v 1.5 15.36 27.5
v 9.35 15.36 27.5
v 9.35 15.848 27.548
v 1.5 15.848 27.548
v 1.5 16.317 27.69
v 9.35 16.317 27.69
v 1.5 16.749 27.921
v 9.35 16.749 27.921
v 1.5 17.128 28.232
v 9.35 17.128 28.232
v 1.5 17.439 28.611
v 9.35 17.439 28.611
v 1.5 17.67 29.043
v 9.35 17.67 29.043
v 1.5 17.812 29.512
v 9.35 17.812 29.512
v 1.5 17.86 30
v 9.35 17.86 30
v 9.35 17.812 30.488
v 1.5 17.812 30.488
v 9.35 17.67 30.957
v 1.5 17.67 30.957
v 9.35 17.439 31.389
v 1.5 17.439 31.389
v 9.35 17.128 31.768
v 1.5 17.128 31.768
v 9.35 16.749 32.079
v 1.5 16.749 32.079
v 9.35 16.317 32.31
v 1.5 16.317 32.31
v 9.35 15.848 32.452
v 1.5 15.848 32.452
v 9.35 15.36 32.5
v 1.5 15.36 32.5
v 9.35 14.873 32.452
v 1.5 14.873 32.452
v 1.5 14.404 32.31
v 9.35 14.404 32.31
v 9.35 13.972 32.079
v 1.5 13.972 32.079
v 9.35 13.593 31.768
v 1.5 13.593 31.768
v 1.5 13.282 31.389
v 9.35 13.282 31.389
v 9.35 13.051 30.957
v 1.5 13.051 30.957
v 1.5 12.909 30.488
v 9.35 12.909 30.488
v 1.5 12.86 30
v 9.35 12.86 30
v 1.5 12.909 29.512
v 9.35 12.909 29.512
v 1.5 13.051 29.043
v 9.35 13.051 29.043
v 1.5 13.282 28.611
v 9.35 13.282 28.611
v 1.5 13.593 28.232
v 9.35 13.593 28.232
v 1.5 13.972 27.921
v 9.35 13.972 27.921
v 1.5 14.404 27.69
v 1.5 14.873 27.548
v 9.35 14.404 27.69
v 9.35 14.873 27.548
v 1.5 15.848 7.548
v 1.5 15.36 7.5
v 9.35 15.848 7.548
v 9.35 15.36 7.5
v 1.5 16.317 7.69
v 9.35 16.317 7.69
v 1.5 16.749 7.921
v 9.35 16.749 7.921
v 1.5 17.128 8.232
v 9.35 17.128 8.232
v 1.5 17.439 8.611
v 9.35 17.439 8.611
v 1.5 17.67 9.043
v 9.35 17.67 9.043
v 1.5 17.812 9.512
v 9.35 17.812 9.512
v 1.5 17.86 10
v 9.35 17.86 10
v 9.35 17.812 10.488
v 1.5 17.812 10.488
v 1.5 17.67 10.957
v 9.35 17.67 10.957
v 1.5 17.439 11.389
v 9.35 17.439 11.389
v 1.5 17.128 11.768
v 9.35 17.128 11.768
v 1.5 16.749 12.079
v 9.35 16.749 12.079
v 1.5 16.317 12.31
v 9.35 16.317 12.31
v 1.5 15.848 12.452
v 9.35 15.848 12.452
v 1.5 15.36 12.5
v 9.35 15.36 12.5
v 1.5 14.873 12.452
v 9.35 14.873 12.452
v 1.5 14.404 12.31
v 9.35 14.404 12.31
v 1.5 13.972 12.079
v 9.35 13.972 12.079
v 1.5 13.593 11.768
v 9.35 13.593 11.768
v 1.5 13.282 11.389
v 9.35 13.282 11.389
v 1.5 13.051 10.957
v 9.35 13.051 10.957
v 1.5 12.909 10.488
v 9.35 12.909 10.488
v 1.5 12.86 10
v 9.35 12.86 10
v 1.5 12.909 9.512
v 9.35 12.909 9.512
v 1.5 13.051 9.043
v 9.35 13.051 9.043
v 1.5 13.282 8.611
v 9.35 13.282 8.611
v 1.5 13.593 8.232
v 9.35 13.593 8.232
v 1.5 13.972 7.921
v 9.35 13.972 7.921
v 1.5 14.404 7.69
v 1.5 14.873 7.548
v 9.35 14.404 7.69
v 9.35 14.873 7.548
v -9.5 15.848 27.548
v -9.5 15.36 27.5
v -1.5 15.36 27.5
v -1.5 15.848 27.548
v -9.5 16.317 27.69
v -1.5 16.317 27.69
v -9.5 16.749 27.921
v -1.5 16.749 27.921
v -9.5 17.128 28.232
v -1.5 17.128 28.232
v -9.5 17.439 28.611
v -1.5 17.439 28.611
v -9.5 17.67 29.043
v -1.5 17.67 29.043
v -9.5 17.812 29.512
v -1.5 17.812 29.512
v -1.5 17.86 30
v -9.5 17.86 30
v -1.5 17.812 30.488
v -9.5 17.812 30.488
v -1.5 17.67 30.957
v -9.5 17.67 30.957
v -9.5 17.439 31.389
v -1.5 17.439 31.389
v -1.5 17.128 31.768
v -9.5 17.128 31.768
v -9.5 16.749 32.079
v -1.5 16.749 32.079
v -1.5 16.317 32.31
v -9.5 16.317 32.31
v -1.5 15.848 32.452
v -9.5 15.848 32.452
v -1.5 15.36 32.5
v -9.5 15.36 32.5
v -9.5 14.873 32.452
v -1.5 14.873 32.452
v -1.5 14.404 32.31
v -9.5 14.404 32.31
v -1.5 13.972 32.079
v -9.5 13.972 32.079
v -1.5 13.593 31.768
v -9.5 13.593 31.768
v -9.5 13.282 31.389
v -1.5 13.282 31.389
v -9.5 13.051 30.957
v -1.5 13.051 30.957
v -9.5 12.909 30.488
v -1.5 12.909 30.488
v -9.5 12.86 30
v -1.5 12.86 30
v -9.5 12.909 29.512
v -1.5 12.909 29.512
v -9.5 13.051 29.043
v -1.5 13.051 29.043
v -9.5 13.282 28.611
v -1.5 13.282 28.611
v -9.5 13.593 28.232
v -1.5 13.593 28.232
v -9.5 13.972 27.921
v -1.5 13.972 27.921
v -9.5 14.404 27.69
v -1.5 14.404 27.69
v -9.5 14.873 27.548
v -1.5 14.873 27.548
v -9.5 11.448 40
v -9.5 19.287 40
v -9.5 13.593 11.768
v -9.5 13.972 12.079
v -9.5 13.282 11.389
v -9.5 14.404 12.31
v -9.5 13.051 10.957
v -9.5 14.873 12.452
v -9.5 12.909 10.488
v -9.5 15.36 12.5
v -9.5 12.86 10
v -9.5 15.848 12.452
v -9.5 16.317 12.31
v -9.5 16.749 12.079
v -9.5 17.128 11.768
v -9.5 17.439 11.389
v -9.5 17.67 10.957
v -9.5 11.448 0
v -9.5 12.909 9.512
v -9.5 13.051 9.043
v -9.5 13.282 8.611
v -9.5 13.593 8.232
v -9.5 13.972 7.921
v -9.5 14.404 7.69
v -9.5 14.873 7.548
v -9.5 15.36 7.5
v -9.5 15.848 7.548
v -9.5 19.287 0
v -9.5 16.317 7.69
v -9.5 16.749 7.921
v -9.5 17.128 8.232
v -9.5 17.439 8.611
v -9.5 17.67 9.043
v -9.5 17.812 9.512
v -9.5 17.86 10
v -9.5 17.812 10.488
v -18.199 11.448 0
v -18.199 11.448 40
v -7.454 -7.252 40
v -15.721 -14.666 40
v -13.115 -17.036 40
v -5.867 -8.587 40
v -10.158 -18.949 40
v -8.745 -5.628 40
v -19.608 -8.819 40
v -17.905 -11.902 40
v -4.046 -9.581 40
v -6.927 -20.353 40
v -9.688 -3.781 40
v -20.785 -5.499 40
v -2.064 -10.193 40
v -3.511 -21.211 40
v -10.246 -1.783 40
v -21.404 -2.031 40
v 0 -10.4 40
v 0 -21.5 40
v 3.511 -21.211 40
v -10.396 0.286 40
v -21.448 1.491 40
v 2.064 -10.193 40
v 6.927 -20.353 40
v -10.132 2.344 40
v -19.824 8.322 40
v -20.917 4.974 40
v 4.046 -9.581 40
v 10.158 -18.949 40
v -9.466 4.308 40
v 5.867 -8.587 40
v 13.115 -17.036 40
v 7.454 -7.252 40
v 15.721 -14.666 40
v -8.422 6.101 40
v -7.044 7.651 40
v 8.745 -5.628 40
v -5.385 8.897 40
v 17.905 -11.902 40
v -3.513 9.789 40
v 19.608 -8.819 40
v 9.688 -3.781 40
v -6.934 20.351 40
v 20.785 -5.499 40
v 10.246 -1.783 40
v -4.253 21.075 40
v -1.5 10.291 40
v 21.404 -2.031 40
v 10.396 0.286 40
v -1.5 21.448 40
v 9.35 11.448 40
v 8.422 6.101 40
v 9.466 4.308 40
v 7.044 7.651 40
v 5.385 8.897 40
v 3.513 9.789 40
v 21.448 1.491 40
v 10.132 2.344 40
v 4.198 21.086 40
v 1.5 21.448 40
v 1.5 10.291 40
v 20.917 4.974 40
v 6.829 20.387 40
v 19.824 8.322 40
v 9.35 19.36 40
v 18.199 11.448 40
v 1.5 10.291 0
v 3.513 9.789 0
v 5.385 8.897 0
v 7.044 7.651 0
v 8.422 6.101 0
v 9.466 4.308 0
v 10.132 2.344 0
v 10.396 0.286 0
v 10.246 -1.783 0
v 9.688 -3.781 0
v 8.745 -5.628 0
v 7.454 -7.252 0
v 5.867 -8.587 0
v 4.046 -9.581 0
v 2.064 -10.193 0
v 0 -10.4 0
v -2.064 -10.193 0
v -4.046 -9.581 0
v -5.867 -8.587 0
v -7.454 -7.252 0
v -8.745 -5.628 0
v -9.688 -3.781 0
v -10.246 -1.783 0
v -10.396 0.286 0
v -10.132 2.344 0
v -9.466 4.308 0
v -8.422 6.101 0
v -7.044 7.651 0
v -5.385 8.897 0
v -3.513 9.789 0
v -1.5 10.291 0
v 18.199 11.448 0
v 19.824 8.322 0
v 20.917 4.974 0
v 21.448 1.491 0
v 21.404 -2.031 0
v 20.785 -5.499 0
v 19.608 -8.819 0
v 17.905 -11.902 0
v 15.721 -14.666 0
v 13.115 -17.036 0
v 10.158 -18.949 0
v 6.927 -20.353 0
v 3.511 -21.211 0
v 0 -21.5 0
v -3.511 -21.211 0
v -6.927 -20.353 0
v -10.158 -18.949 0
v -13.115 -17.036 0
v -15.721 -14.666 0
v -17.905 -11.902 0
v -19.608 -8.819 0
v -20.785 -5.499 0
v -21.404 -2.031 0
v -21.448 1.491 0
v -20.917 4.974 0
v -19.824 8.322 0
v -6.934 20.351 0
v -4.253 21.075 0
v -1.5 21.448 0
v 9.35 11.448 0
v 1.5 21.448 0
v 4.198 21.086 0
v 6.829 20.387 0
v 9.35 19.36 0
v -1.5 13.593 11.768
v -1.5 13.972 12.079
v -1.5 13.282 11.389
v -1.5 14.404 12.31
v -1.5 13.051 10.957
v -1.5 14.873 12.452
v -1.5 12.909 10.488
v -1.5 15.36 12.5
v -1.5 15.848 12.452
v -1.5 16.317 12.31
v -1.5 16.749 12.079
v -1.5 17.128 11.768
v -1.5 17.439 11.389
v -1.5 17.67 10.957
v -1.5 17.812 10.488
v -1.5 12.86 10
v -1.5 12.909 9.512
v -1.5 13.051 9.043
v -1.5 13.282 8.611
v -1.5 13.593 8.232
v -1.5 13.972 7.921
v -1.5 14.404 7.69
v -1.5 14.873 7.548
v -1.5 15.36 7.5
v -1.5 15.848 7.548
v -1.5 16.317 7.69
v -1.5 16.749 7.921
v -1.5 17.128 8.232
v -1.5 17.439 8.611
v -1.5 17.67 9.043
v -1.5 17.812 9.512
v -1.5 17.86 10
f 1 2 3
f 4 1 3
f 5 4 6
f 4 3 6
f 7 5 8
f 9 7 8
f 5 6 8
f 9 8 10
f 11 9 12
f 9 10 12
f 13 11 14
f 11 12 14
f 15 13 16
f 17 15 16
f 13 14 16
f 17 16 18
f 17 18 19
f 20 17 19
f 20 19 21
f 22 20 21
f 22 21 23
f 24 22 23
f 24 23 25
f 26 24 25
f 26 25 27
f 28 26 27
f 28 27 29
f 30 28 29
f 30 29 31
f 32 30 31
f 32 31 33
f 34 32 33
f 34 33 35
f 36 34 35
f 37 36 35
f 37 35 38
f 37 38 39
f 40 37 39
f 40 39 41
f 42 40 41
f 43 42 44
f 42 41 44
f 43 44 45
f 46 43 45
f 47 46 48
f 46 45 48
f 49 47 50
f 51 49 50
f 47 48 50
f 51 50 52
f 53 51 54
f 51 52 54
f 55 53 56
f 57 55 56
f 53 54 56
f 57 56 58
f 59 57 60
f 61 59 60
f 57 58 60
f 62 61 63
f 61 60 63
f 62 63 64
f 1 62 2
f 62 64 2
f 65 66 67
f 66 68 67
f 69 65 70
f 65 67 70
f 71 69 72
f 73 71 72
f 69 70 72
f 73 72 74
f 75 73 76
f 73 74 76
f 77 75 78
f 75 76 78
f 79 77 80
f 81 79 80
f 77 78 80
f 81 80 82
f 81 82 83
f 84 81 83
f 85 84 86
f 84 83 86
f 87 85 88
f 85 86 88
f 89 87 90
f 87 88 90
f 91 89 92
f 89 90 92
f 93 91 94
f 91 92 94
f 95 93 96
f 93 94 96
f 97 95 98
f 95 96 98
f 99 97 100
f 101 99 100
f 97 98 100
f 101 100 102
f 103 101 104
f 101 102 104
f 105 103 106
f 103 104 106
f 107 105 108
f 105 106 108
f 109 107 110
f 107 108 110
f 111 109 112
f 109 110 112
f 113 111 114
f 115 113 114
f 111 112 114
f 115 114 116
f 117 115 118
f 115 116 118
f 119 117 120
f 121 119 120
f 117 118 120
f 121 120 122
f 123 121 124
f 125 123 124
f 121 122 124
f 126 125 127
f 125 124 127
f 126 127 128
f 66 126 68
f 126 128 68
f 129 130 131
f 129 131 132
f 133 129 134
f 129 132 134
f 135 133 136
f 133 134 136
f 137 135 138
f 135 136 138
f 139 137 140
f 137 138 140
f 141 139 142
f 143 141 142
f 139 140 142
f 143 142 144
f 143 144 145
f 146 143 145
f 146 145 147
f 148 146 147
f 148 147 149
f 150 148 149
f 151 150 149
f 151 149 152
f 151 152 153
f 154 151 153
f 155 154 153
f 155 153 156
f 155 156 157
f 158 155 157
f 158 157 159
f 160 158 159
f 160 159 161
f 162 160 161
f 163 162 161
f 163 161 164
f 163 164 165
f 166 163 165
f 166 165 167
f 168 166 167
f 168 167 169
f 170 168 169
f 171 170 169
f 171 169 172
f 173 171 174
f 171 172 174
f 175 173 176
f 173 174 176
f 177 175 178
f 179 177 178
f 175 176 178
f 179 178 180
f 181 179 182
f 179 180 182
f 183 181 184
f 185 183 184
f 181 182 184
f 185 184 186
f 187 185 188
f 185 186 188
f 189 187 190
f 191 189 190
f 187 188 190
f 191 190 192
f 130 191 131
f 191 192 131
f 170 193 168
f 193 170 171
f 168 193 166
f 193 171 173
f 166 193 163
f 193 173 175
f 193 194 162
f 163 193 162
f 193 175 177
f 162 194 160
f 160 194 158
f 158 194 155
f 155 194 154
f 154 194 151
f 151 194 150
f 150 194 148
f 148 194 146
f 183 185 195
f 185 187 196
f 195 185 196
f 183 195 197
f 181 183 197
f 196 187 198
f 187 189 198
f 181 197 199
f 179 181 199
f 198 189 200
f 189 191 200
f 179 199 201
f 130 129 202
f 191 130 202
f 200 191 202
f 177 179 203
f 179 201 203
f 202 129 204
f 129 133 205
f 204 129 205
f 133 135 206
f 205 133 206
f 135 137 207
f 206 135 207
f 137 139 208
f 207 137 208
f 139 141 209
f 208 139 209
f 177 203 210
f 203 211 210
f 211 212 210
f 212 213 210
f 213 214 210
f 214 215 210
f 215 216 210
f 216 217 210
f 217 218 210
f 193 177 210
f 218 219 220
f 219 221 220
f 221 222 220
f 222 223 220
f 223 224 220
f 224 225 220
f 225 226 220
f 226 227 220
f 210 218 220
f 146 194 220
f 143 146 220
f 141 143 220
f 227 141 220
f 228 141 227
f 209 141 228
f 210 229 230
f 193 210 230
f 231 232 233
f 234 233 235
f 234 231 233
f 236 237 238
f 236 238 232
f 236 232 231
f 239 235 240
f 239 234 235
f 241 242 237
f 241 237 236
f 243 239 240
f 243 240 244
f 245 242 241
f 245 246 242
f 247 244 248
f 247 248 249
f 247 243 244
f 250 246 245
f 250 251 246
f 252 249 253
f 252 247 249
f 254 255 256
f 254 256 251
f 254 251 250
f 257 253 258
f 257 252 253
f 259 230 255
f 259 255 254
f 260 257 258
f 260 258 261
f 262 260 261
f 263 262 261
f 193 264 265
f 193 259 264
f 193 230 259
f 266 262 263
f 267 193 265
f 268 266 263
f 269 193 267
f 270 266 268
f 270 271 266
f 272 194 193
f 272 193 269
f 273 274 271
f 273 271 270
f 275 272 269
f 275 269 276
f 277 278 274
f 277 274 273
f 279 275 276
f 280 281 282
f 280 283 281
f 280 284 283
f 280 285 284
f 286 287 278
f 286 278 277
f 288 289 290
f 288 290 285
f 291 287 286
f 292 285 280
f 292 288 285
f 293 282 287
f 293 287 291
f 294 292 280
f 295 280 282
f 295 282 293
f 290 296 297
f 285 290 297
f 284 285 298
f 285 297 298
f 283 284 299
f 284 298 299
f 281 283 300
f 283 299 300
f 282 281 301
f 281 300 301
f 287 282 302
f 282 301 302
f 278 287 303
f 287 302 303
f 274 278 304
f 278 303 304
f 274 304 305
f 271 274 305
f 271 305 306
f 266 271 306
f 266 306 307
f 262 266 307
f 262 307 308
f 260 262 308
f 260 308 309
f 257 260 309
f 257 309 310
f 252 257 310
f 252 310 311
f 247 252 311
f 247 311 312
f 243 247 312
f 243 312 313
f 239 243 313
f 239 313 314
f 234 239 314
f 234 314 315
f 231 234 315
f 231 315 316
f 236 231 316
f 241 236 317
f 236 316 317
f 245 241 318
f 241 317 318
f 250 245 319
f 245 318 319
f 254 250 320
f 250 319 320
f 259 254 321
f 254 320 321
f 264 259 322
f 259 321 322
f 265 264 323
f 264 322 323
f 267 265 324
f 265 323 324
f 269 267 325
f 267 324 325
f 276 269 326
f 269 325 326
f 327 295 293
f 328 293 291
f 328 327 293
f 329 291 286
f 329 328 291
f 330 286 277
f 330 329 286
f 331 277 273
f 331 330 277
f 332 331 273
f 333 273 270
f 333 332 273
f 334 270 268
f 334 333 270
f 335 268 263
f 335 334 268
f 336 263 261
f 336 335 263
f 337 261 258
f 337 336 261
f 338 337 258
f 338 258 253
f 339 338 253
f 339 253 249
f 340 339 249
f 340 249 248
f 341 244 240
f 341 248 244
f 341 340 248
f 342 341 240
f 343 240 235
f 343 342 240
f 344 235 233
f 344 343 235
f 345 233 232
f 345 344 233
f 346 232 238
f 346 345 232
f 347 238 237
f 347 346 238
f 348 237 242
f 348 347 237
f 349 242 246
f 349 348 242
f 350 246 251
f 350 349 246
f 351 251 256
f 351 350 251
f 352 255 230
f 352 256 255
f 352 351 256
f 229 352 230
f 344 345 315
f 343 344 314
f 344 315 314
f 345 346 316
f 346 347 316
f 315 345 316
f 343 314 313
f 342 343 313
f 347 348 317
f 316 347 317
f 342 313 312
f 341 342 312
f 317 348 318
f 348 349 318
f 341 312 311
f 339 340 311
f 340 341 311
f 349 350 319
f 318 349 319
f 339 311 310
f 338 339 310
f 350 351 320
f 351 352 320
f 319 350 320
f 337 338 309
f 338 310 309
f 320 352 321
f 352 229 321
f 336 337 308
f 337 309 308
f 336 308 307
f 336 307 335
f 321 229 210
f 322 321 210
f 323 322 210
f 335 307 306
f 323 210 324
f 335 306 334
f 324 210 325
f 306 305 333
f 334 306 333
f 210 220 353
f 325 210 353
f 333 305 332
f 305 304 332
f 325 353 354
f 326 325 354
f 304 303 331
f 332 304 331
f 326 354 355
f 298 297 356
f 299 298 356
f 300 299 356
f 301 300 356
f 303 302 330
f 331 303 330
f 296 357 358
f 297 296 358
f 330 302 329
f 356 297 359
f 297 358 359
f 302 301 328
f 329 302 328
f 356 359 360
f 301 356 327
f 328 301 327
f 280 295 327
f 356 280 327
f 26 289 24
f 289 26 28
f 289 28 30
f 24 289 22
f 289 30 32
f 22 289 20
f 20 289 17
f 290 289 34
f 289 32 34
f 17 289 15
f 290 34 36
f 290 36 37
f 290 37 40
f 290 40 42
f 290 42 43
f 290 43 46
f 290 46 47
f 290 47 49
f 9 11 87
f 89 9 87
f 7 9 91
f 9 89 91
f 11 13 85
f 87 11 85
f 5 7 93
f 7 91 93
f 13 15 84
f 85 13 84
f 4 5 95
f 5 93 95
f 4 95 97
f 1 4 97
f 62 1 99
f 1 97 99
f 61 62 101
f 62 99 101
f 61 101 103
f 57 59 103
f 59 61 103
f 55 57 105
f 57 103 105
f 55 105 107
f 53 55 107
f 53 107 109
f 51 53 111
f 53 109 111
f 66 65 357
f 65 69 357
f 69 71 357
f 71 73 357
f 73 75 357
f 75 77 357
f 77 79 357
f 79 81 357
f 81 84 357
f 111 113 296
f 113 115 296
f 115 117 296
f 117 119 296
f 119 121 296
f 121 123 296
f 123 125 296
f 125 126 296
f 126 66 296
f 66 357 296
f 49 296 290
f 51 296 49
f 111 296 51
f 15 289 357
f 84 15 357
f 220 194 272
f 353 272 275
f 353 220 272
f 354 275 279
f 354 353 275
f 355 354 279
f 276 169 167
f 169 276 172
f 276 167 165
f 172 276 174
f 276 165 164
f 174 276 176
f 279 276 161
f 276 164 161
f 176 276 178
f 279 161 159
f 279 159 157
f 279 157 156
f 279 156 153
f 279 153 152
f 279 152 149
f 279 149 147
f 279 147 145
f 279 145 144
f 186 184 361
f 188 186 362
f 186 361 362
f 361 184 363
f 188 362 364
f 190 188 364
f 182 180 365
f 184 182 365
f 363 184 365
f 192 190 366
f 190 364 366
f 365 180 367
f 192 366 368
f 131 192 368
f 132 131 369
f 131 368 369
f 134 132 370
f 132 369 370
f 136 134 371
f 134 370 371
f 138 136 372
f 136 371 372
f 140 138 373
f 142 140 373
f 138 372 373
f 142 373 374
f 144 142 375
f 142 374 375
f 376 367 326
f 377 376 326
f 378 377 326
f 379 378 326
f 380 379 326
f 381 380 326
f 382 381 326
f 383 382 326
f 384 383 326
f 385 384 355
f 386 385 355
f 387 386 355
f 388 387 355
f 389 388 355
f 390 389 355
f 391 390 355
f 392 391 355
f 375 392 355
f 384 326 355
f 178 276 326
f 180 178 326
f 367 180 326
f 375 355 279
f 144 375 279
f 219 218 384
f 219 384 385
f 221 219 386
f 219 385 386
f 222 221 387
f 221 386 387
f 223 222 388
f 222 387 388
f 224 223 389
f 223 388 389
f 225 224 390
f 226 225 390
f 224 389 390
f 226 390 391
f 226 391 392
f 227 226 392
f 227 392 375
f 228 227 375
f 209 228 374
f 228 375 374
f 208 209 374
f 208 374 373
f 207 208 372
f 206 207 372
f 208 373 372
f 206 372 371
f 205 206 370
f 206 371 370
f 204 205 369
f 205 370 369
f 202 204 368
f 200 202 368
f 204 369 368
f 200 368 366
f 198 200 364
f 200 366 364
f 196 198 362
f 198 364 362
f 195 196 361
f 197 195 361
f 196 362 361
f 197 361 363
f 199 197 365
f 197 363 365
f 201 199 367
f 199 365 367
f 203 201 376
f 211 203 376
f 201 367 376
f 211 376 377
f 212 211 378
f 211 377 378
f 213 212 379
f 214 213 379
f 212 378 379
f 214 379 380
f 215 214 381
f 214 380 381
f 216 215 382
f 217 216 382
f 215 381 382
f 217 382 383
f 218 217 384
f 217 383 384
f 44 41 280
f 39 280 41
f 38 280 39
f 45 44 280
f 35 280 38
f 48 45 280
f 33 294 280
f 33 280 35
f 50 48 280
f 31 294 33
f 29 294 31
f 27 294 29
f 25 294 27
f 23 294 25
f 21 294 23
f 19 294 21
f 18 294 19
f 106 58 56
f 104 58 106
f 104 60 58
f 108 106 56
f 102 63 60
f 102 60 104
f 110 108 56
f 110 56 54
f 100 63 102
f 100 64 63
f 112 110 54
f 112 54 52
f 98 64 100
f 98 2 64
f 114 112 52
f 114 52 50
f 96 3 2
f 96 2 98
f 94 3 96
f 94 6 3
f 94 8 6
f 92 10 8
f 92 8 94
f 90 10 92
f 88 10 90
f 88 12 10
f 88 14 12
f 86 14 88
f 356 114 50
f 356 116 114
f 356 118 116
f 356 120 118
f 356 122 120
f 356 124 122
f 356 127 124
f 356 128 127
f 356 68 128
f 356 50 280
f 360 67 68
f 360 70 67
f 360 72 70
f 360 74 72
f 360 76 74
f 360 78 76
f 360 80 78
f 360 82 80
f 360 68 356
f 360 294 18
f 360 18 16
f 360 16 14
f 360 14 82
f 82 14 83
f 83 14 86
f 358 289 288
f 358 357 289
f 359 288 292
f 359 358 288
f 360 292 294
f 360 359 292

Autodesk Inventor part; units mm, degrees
ref_plane "YZ Plane" through (0, 0, 0) normal (1, 0, 0) x (0, 1, 0)
ref_plane "XZ Plane" through (0, 0, 0) normal (0, 1, 0) x (-1, 0, 0)
ref_plane "XY Plane" through (0, 0, 0) normal (0, 0, 1) x (1, 0, 0)
sketch "Sketch1" plane through (0, 0, 0) normal (0, 0, 1) x (1, 0, 0)
  point P0 (0, 0)
sketch "Sketch2" plane through (0, 0, 0) normal (0, 0, 1) x (1, 0, 0)
  circle A0 centre (0, 0) radius 10.4
  circle A1 centre (0, 0) radius 21.5
  line L0 (0, 10.0548) -> (-1.5, 10.0548)
  line L1 (-1.5, 10.0548) -> (-1.5, 22.3246)
  line L2 (-1.5, 22.3246) -> (1.5, 22.3246)
  line L3 (1.5, 22.3246) -> (1.5, 10.0548)
  line L4 (1.5, 10.0548) -> (0, 10.0548)
  point P0 (1.5, 21.4476)
  point P1 (1.5, 10.2913)
  point P2 (-1.5, 10.2913)
  point P3 (-1.5, 21.4476)
  dimension "d0" = 20.8
  dimension "d1" = 43
  dimension "d3" = 1.5
  dimension "d4" = 3
extrude "Extrusion1" add sketch "Sketch2" along normal blind 40 contours A0 L3 A1 L1 picked at (17.4874, -2.5592)
ref_plane "Work Plane1" through (0, 10.2913, 0) normal (1, 0, 0) x (0, 0, -1)
ref_plane "Work Plane2" through (21.35, 10.2913, 0) normal (1, 0, 0) x (0, 0, -1)
sketch "Sketch3" plane through (21.35, 10.2913, 0) normal (1, 0, 0) x (0, 0, -1)
  line L0 (-40, 0) -> (-40, 11.1564) projected
  line L1 (-40, 11.1564) -> (-40, 1.1564)
  line L2 (-40, 1.1564) -> (0, 1.1564)
  line L3 (0, 0) -> (-40, 0) projected
  line L4 (0, 0) -> (0, 11.1564) projected
  line L5 (0, 1.1564) -> (0, 11.1564)
  line L6 (0, 11.1564) -> (-40, 11.1564) projected
  line L7 (0, 11.1564) -> (-40, 11.1564)
  point P0 (0, -10.2913)
  dimension "d8" = 10
extrude "Extrusion2" cut sketch "Sketch3" against normal blind 12 contours L0 L6 L4 L2
ref_plane "Work Plane3" through (-21.5, 10.2913, 0) normal (1, 0, 0) x (0, 0, -1)
sketch "Sketch4" plane through (-21.5, 10.2913, 0) normal (1, 0, 0) x (0, 0, -1)
  line L0 (0, 11.1564) -> (-40, 11.1564) projected
  line L1 (0, 11.1564) -> (0, 1.1564)
  line L2 (0, 11.1564) -> (0, 0) projected
  line L3 (0, 1.1564) -> (-40, 1.1564)
  line L4 (-40, 0) -> (-40, 11.1564) projected
  line L5 (-40, 11.1564) -> (0, 11.1564)
  point P0 (0, -10.2913)
  dimension "d12" = 10
extrude "Extrusion3" cut sketch "Sketch4" along normal blind 12
sketch "Sketch5" plane through (9.35, 10.2913, 0) normal (1, 0, 0) x (0, 0, -1)
  circle A0 centre (-30, 5.0692) radius 2.5
  circle A1 centre (-10, 5.0692) radius 2.5
  line L0 (-40, 1.1564) -> (-40, 9.0692) projected
  line L1 (0, 9.0692) -> (0, 1.1564) projected
  line L2 (-40, 9.0692) -> (0, 9.0692) projected
  point P0 (0, -10.2913)
  dimension "d15" = 5
  dimension "d16" = 5
  dimension "d17" = 10
  dimension "d18" = 10
  dimension "d19" = 4
  dimension "d20" = 4
extrude "Extrusion4" cut sketch "Sketch5" against normal through all
properties part number "Cuff"
